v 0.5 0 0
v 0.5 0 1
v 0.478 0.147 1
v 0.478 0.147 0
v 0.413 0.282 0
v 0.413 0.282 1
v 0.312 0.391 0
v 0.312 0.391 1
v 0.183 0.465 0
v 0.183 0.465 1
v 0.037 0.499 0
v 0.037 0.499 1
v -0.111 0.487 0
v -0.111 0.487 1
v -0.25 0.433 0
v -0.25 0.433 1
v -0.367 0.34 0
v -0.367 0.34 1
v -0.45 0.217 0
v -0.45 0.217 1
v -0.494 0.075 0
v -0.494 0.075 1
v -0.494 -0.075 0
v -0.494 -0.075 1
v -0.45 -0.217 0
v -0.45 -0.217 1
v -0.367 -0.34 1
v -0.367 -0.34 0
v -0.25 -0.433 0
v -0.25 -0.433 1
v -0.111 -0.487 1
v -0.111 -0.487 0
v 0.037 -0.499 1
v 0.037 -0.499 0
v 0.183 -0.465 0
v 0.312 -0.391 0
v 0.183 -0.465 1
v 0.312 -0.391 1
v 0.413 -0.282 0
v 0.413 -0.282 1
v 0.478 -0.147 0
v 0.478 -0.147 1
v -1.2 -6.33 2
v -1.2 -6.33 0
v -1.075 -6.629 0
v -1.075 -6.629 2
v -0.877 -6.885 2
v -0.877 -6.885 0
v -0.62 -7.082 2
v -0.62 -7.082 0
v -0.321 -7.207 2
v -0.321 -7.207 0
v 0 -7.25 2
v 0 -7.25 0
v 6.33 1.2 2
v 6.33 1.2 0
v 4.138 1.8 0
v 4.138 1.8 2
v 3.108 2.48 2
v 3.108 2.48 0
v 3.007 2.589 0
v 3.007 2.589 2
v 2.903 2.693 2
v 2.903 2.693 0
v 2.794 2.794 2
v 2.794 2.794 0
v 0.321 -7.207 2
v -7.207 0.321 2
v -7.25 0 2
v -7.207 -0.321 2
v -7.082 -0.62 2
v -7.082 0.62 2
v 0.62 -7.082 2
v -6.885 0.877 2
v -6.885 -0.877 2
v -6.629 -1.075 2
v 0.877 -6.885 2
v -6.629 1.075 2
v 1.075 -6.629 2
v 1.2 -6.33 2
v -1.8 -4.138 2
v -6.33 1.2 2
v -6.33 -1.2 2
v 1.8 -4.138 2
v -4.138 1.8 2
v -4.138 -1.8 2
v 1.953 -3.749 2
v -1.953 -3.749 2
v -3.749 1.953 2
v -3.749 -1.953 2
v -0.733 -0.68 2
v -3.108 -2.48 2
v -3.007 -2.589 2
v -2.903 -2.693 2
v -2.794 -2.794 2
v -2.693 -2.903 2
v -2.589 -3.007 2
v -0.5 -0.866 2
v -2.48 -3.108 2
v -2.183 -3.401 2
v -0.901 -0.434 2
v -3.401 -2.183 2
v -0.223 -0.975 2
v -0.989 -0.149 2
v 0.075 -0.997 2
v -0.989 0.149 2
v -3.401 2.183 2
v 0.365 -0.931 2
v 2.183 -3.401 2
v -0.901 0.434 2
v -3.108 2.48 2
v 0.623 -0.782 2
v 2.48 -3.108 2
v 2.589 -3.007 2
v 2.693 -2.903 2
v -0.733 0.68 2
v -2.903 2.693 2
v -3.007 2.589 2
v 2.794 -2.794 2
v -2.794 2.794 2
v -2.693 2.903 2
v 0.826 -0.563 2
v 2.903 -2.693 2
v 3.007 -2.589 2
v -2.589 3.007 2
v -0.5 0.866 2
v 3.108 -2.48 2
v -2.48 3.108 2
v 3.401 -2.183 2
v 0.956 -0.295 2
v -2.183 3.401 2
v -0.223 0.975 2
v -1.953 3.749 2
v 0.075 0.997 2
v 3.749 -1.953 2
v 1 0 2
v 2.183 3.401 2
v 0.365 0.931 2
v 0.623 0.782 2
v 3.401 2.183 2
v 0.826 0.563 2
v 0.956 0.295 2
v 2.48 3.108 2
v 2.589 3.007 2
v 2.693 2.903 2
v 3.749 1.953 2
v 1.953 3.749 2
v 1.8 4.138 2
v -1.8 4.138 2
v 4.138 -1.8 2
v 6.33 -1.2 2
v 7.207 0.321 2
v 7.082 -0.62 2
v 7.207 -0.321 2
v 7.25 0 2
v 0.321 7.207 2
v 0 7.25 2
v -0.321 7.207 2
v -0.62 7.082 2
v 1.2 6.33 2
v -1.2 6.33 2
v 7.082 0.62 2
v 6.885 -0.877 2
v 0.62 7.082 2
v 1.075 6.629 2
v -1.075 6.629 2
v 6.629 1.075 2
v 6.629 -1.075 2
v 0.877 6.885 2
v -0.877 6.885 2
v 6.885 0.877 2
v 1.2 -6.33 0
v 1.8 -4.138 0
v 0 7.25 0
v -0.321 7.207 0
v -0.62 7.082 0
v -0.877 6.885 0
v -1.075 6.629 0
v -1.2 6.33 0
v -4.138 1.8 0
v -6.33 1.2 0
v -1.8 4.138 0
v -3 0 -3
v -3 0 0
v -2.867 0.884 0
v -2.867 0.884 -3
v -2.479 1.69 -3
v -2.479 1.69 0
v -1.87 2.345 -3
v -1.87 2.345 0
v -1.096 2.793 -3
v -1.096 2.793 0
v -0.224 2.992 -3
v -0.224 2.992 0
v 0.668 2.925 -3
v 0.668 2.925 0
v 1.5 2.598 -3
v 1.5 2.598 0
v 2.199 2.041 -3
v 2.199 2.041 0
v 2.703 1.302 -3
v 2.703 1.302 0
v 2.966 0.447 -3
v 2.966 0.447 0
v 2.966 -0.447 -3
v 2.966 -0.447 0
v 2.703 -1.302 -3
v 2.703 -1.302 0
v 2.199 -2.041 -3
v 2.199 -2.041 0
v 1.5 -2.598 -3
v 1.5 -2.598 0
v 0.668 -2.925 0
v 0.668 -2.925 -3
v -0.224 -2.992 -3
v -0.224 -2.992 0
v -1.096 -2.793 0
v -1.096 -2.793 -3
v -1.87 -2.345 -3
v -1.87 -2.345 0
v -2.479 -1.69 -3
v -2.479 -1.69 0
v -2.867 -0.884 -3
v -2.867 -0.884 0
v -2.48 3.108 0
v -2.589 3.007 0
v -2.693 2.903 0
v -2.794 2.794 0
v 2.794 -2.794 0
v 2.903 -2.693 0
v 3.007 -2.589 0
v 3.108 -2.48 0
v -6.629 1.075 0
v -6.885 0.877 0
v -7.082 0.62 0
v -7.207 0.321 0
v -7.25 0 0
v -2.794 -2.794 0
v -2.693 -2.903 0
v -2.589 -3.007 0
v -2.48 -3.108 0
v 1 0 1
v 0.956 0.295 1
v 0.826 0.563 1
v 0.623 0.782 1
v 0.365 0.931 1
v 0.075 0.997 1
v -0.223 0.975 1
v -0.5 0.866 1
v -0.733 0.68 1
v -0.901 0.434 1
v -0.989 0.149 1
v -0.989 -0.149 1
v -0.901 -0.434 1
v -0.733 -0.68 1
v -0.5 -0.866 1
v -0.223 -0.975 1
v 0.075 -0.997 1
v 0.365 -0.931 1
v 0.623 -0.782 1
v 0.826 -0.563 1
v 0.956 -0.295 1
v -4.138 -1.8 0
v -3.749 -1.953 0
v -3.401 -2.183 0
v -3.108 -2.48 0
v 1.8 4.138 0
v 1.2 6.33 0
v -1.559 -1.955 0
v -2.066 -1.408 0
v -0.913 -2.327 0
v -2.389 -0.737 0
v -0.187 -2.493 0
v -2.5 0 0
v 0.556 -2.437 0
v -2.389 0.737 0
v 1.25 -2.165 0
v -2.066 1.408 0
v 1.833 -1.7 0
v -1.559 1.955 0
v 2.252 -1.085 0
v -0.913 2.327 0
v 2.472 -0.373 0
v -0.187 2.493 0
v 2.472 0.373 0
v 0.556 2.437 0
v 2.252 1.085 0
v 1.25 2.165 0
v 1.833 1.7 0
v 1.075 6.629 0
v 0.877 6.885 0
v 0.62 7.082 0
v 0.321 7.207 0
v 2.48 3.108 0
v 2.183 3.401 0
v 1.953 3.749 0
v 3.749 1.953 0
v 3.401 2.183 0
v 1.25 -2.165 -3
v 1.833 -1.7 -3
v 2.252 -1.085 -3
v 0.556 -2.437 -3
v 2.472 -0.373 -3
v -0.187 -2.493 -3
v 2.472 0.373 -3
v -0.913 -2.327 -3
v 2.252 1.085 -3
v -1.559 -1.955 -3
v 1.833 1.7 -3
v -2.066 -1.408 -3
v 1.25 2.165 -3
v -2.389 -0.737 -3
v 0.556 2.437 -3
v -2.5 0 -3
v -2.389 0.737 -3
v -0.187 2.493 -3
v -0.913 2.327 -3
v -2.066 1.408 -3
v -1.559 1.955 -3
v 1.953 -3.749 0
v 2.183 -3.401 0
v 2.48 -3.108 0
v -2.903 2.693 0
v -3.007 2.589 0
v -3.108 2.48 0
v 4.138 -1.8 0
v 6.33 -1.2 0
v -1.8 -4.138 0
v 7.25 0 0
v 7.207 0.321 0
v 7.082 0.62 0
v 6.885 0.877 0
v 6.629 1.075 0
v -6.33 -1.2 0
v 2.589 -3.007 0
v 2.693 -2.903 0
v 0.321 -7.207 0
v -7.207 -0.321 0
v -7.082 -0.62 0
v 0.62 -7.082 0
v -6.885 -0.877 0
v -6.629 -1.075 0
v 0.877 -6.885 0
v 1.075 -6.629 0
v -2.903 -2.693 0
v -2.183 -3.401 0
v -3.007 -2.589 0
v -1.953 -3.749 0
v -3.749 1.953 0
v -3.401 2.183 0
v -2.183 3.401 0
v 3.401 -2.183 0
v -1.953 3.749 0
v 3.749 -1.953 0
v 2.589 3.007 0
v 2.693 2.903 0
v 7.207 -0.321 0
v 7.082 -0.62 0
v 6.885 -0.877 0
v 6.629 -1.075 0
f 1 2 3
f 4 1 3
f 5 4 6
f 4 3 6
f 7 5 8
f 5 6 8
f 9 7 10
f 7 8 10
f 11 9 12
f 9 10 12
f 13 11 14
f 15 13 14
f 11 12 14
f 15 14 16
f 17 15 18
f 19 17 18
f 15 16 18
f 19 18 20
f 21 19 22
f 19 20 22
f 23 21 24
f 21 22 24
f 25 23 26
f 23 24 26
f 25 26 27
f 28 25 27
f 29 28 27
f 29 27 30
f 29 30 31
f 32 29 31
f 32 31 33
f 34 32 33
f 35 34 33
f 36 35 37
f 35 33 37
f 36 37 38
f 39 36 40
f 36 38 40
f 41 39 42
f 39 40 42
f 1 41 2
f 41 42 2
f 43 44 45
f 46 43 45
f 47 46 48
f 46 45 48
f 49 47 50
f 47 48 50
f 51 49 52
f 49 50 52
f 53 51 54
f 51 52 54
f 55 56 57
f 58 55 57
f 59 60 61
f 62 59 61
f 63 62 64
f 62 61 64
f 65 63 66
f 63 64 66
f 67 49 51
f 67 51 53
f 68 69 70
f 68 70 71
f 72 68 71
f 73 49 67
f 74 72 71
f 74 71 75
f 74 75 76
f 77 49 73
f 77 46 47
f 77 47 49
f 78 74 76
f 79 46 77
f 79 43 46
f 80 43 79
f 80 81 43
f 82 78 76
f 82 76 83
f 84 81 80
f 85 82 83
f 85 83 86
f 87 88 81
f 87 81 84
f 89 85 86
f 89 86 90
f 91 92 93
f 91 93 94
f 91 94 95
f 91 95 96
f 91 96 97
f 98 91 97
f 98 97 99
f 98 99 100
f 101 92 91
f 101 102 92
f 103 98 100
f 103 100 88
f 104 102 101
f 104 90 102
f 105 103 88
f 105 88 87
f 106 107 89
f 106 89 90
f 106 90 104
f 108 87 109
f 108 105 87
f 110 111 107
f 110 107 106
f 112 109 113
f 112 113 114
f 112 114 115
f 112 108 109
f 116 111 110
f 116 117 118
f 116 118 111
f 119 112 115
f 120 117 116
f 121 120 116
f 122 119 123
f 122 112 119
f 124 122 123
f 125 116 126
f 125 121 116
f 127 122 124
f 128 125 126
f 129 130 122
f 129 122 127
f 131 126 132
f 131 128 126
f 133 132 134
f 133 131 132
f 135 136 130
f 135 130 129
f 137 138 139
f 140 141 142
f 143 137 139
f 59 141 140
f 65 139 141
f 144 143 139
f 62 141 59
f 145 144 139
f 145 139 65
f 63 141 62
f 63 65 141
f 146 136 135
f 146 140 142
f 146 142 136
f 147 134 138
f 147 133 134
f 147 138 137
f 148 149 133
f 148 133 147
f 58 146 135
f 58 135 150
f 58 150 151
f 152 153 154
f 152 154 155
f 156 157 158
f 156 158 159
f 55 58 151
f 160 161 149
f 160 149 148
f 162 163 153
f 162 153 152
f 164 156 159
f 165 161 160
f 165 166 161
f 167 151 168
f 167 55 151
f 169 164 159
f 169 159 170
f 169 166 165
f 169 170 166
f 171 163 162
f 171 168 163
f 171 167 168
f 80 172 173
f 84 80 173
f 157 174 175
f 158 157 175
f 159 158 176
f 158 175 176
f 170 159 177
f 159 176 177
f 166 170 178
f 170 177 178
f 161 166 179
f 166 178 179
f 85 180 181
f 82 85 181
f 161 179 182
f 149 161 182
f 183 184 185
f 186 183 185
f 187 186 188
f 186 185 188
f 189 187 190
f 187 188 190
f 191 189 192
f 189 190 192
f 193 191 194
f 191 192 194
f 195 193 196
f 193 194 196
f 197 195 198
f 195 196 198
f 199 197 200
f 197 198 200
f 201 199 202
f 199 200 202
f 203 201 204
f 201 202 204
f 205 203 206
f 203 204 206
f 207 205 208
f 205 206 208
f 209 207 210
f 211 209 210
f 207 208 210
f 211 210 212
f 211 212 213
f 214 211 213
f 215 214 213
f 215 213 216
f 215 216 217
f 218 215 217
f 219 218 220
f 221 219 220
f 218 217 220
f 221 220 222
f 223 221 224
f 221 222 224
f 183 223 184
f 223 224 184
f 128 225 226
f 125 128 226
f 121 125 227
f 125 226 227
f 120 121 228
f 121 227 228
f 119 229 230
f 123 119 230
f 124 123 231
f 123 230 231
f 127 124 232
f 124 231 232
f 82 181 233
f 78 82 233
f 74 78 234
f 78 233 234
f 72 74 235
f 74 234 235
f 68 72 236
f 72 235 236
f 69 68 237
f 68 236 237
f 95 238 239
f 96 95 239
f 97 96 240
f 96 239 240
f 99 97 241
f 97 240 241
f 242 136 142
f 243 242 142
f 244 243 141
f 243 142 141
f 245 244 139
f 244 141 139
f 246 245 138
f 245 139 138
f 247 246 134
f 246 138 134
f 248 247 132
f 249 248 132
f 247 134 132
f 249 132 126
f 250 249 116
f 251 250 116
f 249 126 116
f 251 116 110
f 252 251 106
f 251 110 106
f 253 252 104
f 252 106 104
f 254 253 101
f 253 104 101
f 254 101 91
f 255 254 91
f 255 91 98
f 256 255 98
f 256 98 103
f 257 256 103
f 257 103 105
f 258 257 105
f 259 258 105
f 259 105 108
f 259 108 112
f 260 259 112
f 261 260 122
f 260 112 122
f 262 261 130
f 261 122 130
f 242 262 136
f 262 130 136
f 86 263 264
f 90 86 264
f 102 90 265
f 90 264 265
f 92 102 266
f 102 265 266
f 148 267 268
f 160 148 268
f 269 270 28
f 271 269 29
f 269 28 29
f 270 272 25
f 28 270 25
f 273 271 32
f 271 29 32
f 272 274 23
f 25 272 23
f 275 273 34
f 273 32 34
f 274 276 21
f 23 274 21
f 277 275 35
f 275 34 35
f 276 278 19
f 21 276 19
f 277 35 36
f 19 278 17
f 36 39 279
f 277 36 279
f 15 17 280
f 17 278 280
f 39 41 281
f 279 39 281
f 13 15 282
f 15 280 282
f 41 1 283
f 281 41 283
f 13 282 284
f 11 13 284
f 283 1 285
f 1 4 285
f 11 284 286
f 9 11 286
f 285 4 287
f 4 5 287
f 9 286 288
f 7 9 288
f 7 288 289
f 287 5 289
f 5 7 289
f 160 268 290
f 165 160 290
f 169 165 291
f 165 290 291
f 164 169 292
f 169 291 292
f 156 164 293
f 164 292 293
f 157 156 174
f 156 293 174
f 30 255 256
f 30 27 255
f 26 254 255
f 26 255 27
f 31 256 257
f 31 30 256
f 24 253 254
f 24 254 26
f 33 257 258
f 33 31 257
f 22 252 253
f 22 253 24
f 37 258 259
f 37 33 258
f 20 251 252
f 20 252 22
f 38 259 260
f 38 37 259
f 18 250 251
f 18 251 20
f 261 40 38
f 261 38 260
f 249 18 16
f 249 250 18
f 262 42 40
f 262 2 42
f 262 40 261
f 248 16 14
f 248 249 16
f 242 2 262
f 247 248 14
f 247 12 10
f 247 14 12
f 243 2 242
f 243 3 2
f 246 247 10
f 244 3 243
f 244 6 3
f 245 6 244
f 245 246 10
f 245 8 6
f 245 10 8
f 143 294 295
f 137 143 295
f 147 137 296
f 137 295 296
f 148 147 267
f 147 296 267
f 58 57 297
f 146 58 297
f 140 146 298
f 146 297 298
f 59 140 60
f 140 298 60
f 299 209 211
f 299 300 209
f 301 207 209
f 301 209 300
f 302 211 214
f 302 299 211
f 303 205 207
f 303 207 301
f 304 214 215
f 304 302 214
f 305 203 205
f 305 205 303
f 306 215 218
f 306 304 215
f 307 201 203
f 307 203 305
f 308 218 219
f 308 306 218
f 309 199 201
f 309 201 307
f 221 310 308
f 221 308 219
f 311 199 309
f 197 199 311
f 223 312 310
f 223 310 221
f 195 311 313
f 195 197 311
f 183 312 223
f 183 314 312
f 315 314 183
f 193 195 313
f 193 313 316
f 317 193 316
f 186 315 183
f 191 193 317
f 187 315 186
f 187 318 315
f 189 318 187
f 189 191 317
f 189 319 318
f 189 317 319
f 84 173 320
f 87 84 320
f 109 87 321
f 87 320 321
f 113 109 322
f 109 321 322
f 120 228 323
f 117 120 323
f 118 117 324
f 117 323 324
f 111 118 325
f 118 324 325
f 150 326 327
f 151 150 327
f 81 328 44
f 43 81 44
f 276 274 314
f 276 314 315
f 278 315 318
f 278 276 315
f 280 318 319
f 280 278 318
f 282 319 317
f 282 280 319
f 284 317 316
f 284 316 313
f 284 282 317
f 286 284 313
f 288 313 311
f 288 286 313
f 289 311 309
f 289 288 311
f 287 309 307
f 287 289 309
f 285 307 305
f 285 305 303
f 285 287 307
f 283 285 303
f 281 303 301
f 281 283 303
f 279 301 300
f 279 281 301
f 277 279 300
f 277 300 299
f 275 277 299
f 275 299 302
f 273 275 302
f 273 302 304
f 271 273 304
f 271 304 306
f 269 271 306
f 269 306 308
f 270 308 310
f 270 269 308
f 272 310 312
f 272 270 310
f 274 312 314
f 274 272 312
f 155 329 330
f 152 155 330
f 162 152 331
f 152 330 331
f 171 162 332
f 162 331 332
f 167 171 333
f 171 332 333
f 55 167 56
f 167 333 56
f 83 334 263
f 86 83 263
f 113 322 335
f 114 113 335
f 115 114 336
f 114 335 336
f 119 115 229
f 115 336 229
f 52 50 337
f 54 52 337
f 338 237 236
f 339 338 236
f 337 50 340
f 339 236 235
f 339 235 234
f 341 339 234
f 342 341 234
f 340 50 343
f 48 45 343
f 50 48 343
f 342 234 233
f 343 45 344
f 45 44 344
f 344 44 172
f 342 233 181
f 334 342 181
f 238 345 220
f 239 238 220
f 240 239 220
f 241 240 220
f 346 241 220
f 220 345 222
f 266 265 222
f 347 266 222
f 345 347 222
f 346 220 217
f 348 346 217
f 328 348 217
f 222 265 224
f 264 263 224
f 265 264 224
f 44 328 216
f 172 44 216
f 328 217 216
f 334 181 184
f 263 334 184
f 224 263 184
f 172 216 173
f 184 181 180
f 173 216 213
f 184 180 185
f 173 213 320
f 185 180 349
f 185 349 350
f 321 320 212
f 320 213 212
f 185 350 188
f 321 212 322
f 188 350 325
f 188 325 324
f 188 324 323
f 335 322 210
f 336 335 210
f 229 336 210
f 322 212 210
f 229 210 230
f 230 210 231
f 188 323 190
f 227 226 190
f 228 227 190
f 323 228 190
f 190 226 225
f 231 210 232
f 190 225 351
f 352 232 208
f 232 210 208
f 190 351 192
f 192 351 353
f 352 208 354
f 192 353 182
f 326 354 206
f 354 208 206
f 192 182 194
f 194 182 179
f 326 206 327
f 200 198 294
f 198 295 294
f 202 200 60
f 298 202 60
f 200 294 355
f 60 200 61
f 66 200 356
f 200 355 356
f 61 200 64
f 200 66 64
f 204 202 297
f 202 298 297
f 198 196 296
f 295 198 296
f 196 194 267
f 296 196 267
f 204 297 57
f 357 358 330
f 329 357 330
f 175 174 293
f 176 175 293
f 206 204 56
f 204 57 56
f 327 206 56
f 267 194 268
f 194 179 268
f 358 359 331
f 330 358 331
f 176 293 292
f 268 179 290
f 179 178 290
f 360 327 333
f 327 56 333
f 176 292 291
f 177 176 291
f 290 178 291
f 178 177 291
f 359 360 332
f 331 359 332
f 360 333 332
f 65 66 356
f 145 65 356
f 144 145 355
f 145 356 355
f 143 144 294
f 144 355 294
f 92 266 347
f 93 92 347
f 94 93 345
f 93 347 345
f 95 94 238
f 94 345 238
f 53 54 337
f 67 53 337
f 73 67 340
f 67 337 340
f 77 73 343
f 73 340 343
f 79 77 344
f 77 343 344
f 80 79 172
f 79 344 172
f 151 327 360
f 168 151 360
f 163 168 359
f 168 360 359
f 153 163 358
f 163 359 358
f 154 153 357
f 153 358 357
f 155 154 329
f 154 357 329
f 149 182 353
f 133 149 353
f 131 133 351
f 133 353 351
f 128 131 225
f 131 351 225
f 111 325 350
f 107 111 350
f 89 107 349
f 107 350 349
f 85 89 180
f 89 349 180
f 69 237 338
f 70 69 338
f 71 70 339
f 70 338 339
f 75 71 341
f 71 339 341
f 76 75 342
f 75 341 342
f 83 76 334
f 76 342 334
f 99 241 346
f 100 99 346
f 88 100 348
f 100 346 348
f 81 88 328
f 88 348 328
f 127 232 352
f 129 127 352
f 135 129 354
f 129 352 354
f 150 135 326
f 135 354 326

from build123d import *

# Parameters (mm, degrees)
BOSS_EXTRUDE1_DEPTH = 2
SKETCH2_R           = 3
SKETCH2_R_2         = 2.5
BOSS_EXTRUDE2_DEPTH = 3
SKETCH3_R           = 1
CUT_EXTRUDE1_DEPTH  = 1
SKETCH4_R           = 0.5
CUT_EXTRUDE2_DEPTH  = 1


with BuildPart() as part:
    # Sketch1 → Boss-Extrude1 (new body)
    with BuildSketch(Plane.XY):
        with BuildLine():
            Line((1.2, -6.33), (1.8, -4.1378116))
            ThreePointArc((1.8, -4.1378116), (2.058560194, -3.569045514), (2.48, -3.1078116))
            ThreePointArc((2.48, -3.1078116), (2.641475661, -2.955390865), (2.794244497, -2.794244497))
            ThreePointArc((2.794244497, -2.794244497), (2.955390865, -2.641475661), (3.1078116, -2.48))
            ThreePointArc((3.1078116, -2.48), (3.569045514, -2.058560194), (4.1378116, -1.8))
            Line((4.1378116, -1.8), (6.33, -1.2))
            ThreePointArc((6.33, -1.2), (6.992020752, -0.754882576), (7.25, 0))
            ThreePointArc((7.25, 0), (6.992020752, 0.754882576), (6.33, 1.2))
            Line((6.33, 1.2), (4.1378116, 1.8))
            ThreePointArc((4.1378116, 1.8), (3.569045514, 2.058560194), (3.1078116, 2.48))
            ThreePointArc((3.1078116, 2.48), (2.955390865, 2.641475661), (2.794244497, 2.794244497))
            ThreePointArc((2.794244497, 2.794244497), (2.641475661, 2.955390865), (2.48, 3.1078116))
            ThreePointArc((2.48, 3.1078116), (2.058560194, 3.569045514), (1.8, 4.1378116))
            Line((1.8, 4.1378116), (1.2, 6.33))
            ThreePointArc((1.2, 6.33), (0.754882576, 6.992020752), (0, 7.25))
            ThreePointArc((0, 7.25), (-0.754882576, 6.992020752), (-1.2, 6.33))
            Line((-1.2, 6.33), (-1.8, 4.1378116))
            ThreePointArc((-1.8, 4.1378116), (-2.058560194, 3.569045514), (-2.48, 3.1078116))
            ThreePointArc((-2.48, 3.1078116), (-2.641475661, 2.955390865), (-2.794244497, 2.794244497))
            ThreePointArc((-2.794244497, 2.794244497), (-2.955390865, 2.641475661), (-3.1078116, 2.48))
            ThreePointArc((-3.1078116, 2.48), (-3.569045514, 2.058560194), (-4.1378116, 1.8))
            Line((-4.1378116, 1.8), (-6.33, 1.2))
            ThreePointArc((-6.33, 1.2), (-6.992020752, 0.754882576), (-7.25, 0))
            ThreePointArc((-7.25, 0), (-6.992020752, -0.754882576), (-6.33, -1.2))
            Line((-6.33, -1.2), (-4.1378116, -1.8))
            ThreePointArc((-4.1378116, -1.8), (-3.569045514, -2.058560194), (-3.1078116, -2.48))
            ThreePointArc((-3.1078116, -2.48), (-2.955390865, -2.641475661), (-2.794244497, -2.794244497))
            ThreePointArc((-2.794244497, -2.794244497), (-2.641475661, -2.955390865), (-2.48, -3.1078116))
            ThreePointArc((-2.48, -3.1078116), (-2.058560194, -3.569045514), (-1.8, -4.1378116))
            Line((-1.8, -4.1378116), (-1.2, -6.33))
            ThreePointArc((-1.2, -6.33), (-0.754882576, -6.992020752), (0, -7.25))
            ThreePointArc((0, -7.25), (0.754882576, -6.992020752), (1.2, -6.33))
        make_face()
    extrude(amount=BOSS_EXTRUDE1_DEPTH)

    # Sketch2 → Boss-Extrude2 (add)
    with BuildSketch(Plane(origin=(0, 0, 0), x_dir=(-1, 0, 0), z_dir=(0, 0, -1))):
        Circle(SKETCH2_R)
        Circle(SKETCH2_R_2, mode=Mode.SUBTRACT)
    extrude(amount=BOSS_EXTRUDE2_DEPTH)

    # Sketch3 → Cut-Extrude1 (cut)
    with BuildSketch(Plane.XY.offset(2)):
        Circle(SKETCH3_R)
    extrude(amount=-CUT_EXTRUDE1_DEPTH, mode=Mode.SUBTRACT)

    # Sketch4 → Cut-Extrude2 (cut)
    with BuildSketch(Plane.XY.offset(1)):
        Circle(SKETCH4_R)
    extrude(amount=-CUT_EXTRUDE2_DEPTH, mode=Mode.SUBTRACT)


solid = part.part
